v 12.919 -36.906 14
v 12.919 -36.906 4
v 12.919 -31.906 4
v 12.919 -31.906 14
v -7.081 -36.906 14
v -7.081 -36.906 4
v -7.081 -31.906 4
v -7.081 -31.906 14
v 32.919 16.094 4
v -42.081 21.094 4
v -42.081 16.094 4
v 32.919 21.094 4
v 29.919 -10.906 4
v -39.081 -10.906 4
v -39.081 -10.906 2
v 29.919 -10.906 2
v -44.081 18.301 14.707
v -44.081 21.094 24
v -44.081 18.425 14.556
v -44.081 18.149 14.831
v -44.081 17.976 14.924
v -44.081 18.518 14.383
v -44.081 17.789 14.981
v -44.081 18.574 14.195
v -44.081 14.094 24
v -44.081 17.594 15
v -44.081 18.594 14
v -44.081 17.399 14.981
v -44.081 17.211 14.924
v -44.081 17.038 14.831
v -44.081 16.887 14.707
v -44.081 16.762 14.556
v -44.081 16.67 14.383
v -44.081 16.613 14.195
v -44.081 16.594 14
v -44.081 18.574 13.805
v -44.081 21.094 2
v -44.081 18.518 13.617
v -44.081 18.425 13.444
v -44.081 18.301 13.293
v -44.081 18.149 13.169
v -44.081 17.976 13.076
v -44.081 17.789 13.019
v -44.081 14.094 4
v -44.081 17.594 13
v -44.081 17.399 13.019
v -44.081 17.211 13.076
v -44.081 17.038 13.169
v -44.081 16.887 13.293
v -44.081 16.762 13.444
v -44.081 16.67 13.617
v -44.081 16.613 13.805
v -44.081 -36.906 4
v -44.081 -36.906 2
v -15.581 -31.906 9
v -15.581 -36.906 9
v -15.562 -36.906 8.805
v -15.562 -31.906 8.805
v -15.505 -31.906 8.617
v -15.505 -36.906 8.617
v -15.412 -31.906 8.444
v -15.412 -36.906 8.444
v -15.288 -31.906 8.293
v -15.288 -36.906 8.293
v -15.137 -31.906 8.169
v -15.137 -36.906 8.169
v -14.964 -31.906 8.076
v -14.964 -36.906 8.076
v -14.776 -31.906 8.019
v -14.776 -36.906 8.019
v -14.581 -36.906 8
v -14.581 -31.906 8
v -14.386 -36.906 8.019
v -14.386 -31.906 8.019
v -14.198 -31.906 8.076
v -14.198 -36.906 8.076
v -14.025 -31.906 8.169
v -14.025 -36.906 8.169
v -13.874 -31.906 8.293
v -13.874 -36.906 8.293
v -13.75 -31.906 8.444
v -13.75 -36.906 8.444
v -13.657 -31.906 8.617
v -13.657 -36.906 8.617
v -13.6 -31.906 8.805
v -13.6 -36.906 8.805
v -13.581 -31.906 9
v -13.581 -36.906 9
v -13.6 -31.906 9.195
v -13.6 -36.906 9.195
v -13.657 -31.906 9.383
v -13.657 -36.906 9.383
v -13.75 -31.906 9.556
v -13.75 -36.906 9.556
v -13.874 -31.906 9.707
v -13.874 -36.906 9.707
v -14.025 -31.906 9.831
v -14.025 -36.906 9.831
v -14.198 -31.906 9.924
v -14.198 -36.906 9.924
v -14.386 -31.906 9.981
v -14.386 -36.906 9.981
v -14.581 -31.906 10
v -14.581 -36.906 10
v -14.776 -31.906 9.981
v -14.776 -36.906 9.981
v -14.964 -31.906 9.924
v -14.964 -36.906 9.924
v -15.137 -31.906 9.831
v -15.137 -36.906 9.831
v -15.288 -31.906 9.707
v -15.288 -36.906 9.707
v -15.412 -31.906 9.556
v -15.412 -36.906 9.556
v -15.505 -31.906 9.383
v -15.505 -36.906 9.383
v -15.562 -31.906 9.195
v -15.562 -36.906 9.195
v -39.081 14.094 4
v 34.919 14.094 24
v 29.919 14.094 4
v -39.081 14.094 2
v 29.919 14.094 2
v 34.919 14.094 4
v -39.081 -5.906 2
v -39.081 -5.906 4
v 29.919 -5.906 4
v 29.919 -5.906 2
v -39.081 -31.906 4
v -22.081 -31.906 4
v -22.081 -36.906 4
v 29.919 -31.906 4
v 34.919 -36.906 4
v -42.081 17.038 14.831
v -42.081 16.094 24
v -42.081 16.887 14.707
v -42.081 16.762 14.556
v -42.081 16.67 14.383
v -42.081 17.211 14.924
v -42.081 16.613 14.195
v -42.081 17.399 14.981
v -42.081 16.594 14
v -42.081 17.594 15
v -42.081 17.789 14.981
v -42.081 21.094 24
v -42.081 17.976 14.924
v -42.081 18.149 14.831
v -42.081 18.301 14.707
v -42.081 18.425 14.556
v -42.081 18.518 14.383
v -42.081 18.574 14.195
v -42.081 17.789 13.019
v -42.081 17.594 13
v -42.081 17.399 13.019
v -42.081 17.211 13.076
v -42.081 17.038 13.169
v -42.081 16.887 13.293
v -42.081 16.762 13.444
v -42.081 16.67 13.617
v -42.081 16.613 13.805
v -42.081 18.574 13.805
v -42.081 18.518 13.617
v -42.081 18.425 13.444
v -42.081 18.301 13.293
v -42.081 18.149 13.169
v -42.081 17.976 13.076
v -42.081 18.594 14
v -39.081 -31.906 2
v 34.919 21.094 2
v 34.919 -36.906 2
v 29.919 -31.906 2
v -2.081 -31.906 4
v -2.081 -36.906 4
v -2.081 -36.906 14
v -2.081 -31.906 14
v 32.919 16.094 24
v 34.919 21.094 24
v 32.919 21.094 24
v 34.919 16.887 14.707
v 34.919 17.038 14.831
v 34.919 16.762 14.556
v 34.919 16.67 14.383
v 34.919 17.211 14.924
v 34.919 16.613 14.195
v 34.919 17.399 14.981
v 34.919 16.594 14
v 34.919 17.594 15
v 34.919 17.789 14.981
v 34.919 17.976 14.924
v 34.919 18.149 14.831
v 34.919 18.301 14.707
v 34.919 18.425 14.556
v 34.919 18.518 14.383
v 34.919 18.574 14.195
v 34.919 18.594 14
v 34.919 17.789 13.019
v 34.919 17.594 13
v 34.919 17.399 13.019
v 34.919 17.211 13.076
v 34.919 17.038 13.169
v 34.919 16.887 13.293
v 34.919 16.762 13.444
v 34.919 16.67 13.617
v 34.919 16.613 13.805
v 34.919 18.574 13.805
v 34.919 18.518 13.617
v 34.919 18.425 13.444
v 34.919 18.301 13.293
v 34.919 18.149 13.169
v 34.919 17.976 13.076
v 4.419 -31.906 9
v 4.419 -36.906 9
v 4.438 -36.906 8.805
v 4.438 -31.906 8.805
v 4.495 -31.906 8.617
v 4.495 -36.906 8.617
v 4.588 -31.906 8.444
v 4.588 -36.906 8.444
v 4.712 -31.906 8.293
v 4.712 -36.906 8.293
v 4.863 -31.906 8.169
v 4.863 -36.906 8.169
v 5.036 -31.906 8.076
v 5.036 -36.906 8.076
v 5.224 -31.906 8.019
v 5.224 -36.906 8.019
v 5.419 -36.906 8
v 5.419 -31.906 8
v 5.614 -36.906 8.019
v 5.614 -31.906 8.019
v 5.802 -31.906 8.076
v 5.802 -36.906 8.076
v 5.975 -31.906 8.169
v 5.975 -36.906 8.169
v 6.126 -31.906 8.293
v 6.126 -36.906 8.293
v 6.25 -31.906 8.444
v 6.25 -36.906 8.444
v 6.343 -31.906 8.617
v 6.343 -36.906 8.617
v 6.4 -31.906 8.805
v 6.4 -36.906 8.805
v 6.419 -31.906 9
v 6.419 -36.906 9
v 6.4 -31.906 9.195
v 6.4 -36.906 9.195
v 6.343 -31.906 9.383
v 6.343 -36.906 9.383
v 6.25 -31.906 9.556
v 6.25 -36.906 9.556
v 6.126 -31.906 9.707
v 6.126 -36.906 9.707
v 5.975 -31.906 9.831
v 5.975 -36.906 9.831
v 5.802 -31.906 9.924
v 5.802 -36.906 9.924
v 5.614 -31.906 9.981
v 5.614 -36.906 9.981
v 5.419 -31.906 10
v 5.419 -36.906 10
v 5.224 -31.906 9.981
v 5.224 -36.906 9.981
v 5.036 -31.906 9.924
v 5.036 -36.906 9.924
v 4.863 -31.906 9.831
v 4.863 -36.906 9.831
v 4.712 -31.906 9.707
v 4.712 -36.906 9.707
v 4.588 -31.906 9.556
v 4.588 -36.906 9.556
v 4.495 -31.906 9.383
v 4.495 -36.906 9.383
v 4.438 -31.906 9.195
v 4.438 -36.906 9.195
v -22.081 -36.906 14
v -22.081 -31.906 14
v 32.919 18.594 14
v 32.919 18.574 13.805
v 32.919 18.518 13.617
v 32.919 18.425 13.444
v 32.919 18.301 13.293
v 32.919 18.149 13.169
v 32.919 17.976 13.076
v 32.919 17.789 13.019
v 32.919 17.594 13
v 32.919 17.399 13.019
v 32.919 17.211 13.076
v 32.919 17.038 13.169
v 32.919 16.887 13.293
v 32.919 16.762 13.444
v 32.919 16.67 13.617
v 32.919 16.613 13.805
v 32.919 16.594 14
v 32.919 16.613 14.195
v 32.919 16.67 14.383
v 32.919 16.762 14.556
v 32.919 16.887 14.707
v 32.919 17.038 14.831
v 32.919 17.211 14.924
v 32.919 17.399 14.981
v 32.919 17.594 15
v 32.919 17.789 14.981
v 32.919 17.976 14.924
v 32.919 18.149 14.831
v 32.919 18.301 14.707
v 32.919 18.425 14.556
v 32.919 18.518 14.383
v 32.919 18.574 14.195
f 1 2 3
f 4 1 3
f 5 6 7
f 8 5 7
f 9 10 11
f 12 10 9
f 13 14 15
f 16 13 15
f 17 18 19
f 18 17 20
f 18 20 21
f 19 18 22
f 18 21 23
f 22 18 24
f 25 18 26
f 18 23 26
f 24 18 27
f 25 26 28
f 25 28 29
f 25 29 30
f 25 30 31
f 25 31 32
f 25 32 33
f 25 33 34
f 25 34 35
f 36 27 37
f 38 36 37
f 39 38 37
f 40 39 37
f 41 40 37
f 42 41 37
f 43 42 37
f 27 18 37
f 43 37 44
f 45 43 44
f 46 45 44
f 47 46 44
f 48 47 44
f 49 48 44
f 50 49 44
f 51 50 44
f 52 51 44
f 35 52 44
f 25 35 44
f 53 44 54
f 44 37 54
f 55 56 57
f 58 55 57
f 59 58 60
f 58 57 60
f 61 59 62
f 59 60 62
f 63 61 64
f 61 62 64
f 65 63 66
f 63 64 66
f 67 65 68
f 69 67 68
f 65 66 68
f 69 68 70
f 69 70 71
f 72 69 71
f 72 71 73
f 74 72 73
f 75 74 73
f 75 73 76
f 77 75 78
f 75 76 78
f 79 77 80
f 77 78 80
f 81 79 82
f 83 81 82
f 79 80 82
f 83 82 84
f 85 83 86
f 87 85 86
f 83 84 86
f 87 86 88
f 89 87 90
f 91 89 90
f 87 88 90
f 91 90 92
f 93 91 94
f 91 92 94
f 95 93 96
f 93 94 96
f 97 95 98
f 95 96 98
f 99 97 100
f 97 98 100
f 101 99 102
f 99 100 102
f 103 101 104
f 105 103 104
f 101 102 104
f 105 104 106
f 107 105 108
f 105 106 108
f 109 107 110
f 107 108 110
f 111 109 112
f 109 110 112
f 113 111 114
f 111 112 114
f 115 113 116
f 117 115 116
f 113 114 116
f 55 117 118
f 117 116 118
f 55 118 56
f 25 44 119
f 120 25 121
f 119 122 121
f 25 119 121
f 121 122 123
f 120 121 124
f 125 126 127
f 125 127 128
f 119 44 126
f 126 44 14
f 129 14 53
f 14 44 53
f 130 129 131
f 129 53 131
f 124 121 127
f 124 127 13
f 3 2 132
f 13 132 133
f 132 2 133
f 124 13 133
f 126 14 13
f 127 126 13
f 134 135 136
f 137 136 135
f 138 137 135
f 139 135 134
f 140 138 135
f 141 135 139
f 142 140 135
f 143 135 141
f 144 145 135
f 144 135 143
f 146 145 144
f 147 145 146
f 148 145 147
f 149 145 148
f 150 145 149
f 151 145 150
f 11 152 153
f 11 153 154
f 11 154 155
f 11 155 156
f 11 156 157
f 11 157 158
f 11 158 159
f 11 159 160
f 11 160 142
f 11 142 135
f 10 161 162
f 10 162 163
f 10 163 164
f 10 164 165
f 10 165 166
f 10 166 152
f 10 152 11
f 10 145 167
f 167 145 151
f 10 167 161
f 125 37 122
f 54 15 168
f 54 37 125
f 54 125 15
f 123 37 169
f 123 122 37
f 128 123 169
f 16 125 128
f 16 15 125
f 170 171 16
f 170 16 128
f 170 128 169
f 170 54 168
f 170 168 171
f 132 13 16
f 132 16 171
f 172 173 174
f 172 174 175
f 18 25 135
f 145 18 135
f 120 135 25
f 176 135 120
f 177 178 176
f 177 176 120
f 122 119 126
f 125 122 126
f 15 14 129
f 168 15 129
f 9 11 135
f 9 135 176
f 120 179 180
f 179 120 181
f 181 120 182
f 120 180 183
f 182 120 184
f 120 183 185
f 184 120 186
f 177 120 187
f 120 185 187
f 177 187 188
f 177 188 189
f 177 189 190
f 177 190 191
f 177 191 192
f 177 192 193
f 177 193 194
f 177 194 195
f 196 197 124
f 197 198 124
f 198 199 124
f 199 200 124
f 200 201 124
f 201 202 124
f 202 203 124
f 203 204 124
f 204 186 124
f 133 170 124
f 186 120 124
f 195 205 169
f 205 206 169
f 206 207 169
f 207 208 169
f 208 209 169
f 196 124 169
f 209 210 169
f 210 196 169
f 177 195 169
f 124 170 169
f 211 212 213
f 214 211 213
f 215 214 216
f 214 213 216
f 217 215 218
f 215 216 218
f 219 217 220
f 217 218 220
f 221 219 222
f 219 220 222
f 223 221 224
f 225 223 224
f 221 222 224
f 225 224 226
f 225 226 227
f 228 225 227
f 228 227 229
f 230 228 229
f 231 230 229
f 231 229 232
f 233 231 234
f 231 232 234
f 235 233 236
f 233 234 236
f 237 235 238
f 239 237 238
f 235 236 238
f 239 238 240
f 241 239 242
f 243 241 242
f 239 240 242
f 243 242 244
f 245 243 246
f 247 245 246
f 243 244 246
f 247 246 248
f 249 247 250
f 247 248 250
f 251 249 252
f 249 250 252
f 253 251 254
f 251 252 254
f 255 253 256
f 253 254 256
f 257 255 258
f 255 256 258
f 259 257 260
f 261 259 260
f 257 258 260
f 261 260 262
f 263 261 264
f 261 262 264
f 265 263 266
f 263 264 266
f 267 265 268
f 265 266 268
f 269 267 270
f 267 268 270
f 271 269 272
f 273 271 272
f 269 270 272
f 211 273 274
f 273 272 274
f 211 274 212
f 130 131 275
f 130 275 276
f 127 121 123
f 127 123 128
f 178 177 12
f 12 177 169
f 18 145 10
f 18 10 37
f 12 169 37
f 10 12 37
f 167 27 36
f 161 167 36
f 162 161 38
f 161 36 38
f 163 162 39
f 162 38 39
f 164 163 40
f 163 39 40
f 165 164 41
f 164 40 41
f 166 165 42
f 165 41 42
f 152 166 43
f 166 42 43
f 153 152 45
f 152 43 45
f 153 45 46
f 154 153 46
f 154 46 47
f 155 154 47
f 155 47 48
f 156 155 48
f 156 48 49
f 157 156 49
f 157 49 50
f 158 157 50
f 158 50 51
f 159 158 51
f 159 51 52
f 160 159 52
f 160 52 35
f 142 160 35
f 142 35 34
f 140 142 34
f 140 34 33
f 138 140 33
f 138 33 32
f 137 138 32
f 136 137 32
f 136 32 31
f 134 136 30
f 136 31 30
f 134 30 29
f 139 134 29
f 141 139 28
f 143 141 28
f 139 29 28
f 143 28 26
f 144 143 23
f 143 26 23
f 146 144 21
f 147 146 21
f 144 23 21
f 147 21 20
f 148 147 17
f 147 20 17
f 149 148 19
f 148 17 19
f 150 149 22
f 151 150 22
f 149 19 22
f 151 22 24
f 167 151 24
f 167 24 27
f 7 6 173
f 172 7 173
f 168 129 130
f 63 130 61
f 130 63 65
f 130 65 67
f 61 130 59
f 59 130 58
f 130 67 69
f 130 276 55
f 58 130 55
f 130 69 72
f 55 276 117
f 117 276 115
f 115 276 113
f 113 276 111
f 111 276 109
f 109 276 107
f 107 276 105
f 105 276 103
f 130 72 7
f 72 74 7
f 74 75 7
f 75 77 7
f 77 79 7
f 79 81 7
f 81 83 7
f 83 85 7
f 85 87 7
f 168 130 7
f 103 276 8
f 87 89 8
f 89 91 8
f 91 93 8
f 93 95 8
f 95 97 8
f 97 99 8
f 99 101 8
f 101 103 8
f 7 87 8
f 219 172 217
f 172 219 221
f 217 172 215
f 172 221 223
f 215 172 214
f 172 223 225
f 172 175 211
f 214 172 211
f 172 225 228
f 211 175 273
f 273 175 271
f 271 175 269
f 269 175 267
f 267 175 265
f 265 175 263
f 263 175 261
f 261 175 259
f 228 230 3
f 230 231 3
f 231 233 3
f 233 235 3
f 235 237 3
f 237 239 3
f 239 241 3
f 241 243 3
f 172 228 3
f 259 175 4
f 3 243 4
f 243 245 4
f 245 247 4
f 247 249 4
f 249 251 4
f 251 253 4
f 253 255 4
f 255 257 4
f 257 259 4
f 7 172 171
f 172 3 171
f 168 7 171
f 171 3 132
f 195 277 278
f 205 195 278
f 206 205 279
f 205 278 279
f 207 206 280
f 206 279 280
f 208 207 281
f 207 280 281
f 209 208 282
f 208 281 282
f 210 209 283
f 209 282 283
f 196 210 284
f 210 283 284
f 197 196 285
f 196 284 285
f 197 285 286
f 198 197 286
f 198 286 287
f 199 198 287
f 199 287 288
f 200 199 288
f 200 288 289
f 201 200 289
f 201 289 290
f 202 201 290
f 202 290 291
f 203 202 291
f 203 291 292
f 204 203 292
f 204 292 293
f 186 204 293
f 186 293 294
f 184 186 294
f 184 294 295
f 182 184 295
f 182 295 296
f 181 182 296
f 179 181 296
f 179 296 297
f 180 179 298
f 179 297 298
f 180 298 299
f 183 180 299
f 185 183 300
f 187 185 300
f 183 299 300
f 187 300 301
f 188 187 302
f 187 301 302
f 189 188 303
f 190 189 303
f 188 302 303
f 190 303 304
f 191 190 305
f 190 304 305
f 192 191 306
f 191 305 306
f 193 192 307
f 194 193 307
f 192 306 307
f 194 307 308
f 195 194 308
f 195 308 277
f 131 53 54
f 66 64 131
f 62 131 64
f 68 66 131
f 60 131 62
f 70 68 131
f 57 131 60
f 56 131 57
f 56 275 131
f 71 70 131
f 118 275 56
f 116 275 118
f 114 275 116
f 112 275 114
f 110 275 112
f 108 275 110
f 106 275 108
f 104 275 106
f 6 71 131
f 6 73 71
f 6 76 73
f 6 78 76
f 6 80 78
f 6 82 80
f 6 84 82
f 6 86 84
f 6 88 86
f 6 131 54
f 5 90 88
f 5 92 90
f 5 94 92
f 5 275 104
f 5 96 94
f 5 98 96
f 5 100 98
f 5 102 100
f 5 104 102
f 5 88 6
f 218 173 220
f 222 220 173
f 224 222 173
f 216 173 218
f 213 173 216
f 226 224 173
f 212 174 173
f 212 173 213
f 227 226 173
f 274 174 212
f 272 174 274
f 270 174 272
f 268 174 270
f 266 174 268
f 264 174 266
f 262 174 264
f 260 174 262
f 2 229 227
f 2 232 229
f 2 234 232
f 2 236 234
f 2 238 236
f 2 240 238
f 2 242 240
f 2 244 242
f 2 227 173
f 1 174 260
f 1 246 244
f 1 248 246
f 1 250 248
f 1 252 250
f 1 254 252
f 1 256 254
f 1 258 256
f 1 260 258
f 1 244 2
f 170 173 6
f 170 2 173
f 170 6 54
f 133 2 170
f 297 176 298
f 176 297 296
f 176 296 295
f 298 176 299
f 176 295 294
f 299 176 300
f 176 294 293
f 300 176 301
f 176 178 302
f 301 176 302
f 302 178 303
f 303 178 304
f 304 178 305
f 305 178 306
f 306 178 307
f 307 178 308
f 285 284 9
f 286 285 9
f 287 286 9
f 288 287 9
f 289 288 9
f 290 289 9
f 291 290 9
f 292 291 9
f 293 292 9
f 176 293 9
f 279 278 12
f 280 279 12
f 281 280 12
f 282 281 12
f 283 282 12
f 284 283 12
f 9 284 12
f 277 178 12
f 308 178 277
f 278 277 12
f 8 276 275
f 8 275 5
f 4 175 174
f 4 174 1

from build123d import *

# Parameters (mm, degrees)
F0_W      = 79
F0_H      = 58
F0_W_2    = 69
F0_H_2    = 46
F1_DEPTH  = 2
F2_W      = 15
F2_H      = 5
F3_DEPTH  = 10
F5_DEPTH  = 20
F6_W      = 75
F6_H      = 20
F7_DEPTH  = 5
F8_R      = 1
F9_DEPTH  = 5
F10_R     = 1
F11_DEPTH = 79.001
F12_W     = 5
F12_H     = 2
F13_DEPTH = 69
F14_ANGLE = 180


with BuildPart() as f1:
    # F0 (on Top) → F1 (new body)
    with BuildSketch(Plane.XY):
        with Locations((-4.5810023546, -13.9063113923)):
            Rectangle(F0_W, F0_H)
        with Locations((-4.5810023546, -12.9063113923)):
            Rectangle(F0_W_2, F0_H_2, mode=Mode.SUBTRACT)
    extrude(amount=F1_DEPTH)

    # F2 (on face) → F3 (join)
    with BuildSketch(Plane(origin=(0, 0, 0), x_dir=(1, 0, 0), z_dir=(0, 0, -1))):
        with Locations((5.4189976454, -12.5936886077)):
            Rectangle(F2_W, F2_H)
        with Locations((-14.5810023546, -12.5936886077)):
            Rectangle(F2_W, F2_H)
    extrude(amount=F3_DEPTH)

    # F4 (on face) → F5 (join)
    with BuildSketch(Plane(origin=(0, 0, 0), x_dir=(1, 0, 0), z_dir=(0, 0, -1))):
        Polygon((34.9189976454, 35.9063113923), (34.9189976454, 42.9063113923), (-44.0810023546, 42.9063113923), (-44.0810023546, 35.9063113923), (-39.0810023546, 35.9063113923), (29.9189976454, 35.9063113923), align=None)
    extrude(amount=F5_DEPTH)

    # F6 (on face) → F7 (cut)
    with BuildSketch(Plane.XZ.offset(42.9063113923)):
        with Locations((-4.5810023546, -10)):
            Rectangle(F6_W, F6_H)
    extrude(amount=-F7_DEPTH, mode=Mode.SUBTRACT)

    # F8 (on face) → F9 (cut, through all)
    with BuildSketch(Plane(origin=(0, 15.0936886077, 0), x_dir=(-1, 0, 0), z_dir=(0, 1, 0))):
        with Locations((-5.4189976454, -5)):
            Circle(F8_R)
        with Locations((14.5810023546, -5)):
            Circle(F8_R)
    extrude(amount=-F9_DEPTH, mode=Mode.SUBTRACT)

    # F10 (on face) → F11 (cut, through all)
    with BuildSketch(Plane(origin=(-44.0810023546, 0, 0), x_dir=(0, -1, 0), z_dir=(-1, 0, 0))):
        with Locations((39.4063113923, -10)):
            Circle(F10_R)
    extrude(amount=-F11_DEPTH, mode=Mode.SUBTRACT)

    # F12 (on face) → F13 (join, through all)
    with BuildSketch(Plane(origin=(29.9189976454, 0, 0), x_dir=(0, -1, 0), z_dir=(-1, 0, 0))):
        with Locations((13.4063113923, 1)):
            Rectangle(F12_W, F12_H)
    extrude(amount=F13_DEPTH)


with BuildPart() as f1_1:
    # F14: moved
    add(f1.part.rotate(Axis((-4.5810023546, -10.9063113923, 2), (1, 0, 0)), F14_ANGLE))


solid = f1_1.part
